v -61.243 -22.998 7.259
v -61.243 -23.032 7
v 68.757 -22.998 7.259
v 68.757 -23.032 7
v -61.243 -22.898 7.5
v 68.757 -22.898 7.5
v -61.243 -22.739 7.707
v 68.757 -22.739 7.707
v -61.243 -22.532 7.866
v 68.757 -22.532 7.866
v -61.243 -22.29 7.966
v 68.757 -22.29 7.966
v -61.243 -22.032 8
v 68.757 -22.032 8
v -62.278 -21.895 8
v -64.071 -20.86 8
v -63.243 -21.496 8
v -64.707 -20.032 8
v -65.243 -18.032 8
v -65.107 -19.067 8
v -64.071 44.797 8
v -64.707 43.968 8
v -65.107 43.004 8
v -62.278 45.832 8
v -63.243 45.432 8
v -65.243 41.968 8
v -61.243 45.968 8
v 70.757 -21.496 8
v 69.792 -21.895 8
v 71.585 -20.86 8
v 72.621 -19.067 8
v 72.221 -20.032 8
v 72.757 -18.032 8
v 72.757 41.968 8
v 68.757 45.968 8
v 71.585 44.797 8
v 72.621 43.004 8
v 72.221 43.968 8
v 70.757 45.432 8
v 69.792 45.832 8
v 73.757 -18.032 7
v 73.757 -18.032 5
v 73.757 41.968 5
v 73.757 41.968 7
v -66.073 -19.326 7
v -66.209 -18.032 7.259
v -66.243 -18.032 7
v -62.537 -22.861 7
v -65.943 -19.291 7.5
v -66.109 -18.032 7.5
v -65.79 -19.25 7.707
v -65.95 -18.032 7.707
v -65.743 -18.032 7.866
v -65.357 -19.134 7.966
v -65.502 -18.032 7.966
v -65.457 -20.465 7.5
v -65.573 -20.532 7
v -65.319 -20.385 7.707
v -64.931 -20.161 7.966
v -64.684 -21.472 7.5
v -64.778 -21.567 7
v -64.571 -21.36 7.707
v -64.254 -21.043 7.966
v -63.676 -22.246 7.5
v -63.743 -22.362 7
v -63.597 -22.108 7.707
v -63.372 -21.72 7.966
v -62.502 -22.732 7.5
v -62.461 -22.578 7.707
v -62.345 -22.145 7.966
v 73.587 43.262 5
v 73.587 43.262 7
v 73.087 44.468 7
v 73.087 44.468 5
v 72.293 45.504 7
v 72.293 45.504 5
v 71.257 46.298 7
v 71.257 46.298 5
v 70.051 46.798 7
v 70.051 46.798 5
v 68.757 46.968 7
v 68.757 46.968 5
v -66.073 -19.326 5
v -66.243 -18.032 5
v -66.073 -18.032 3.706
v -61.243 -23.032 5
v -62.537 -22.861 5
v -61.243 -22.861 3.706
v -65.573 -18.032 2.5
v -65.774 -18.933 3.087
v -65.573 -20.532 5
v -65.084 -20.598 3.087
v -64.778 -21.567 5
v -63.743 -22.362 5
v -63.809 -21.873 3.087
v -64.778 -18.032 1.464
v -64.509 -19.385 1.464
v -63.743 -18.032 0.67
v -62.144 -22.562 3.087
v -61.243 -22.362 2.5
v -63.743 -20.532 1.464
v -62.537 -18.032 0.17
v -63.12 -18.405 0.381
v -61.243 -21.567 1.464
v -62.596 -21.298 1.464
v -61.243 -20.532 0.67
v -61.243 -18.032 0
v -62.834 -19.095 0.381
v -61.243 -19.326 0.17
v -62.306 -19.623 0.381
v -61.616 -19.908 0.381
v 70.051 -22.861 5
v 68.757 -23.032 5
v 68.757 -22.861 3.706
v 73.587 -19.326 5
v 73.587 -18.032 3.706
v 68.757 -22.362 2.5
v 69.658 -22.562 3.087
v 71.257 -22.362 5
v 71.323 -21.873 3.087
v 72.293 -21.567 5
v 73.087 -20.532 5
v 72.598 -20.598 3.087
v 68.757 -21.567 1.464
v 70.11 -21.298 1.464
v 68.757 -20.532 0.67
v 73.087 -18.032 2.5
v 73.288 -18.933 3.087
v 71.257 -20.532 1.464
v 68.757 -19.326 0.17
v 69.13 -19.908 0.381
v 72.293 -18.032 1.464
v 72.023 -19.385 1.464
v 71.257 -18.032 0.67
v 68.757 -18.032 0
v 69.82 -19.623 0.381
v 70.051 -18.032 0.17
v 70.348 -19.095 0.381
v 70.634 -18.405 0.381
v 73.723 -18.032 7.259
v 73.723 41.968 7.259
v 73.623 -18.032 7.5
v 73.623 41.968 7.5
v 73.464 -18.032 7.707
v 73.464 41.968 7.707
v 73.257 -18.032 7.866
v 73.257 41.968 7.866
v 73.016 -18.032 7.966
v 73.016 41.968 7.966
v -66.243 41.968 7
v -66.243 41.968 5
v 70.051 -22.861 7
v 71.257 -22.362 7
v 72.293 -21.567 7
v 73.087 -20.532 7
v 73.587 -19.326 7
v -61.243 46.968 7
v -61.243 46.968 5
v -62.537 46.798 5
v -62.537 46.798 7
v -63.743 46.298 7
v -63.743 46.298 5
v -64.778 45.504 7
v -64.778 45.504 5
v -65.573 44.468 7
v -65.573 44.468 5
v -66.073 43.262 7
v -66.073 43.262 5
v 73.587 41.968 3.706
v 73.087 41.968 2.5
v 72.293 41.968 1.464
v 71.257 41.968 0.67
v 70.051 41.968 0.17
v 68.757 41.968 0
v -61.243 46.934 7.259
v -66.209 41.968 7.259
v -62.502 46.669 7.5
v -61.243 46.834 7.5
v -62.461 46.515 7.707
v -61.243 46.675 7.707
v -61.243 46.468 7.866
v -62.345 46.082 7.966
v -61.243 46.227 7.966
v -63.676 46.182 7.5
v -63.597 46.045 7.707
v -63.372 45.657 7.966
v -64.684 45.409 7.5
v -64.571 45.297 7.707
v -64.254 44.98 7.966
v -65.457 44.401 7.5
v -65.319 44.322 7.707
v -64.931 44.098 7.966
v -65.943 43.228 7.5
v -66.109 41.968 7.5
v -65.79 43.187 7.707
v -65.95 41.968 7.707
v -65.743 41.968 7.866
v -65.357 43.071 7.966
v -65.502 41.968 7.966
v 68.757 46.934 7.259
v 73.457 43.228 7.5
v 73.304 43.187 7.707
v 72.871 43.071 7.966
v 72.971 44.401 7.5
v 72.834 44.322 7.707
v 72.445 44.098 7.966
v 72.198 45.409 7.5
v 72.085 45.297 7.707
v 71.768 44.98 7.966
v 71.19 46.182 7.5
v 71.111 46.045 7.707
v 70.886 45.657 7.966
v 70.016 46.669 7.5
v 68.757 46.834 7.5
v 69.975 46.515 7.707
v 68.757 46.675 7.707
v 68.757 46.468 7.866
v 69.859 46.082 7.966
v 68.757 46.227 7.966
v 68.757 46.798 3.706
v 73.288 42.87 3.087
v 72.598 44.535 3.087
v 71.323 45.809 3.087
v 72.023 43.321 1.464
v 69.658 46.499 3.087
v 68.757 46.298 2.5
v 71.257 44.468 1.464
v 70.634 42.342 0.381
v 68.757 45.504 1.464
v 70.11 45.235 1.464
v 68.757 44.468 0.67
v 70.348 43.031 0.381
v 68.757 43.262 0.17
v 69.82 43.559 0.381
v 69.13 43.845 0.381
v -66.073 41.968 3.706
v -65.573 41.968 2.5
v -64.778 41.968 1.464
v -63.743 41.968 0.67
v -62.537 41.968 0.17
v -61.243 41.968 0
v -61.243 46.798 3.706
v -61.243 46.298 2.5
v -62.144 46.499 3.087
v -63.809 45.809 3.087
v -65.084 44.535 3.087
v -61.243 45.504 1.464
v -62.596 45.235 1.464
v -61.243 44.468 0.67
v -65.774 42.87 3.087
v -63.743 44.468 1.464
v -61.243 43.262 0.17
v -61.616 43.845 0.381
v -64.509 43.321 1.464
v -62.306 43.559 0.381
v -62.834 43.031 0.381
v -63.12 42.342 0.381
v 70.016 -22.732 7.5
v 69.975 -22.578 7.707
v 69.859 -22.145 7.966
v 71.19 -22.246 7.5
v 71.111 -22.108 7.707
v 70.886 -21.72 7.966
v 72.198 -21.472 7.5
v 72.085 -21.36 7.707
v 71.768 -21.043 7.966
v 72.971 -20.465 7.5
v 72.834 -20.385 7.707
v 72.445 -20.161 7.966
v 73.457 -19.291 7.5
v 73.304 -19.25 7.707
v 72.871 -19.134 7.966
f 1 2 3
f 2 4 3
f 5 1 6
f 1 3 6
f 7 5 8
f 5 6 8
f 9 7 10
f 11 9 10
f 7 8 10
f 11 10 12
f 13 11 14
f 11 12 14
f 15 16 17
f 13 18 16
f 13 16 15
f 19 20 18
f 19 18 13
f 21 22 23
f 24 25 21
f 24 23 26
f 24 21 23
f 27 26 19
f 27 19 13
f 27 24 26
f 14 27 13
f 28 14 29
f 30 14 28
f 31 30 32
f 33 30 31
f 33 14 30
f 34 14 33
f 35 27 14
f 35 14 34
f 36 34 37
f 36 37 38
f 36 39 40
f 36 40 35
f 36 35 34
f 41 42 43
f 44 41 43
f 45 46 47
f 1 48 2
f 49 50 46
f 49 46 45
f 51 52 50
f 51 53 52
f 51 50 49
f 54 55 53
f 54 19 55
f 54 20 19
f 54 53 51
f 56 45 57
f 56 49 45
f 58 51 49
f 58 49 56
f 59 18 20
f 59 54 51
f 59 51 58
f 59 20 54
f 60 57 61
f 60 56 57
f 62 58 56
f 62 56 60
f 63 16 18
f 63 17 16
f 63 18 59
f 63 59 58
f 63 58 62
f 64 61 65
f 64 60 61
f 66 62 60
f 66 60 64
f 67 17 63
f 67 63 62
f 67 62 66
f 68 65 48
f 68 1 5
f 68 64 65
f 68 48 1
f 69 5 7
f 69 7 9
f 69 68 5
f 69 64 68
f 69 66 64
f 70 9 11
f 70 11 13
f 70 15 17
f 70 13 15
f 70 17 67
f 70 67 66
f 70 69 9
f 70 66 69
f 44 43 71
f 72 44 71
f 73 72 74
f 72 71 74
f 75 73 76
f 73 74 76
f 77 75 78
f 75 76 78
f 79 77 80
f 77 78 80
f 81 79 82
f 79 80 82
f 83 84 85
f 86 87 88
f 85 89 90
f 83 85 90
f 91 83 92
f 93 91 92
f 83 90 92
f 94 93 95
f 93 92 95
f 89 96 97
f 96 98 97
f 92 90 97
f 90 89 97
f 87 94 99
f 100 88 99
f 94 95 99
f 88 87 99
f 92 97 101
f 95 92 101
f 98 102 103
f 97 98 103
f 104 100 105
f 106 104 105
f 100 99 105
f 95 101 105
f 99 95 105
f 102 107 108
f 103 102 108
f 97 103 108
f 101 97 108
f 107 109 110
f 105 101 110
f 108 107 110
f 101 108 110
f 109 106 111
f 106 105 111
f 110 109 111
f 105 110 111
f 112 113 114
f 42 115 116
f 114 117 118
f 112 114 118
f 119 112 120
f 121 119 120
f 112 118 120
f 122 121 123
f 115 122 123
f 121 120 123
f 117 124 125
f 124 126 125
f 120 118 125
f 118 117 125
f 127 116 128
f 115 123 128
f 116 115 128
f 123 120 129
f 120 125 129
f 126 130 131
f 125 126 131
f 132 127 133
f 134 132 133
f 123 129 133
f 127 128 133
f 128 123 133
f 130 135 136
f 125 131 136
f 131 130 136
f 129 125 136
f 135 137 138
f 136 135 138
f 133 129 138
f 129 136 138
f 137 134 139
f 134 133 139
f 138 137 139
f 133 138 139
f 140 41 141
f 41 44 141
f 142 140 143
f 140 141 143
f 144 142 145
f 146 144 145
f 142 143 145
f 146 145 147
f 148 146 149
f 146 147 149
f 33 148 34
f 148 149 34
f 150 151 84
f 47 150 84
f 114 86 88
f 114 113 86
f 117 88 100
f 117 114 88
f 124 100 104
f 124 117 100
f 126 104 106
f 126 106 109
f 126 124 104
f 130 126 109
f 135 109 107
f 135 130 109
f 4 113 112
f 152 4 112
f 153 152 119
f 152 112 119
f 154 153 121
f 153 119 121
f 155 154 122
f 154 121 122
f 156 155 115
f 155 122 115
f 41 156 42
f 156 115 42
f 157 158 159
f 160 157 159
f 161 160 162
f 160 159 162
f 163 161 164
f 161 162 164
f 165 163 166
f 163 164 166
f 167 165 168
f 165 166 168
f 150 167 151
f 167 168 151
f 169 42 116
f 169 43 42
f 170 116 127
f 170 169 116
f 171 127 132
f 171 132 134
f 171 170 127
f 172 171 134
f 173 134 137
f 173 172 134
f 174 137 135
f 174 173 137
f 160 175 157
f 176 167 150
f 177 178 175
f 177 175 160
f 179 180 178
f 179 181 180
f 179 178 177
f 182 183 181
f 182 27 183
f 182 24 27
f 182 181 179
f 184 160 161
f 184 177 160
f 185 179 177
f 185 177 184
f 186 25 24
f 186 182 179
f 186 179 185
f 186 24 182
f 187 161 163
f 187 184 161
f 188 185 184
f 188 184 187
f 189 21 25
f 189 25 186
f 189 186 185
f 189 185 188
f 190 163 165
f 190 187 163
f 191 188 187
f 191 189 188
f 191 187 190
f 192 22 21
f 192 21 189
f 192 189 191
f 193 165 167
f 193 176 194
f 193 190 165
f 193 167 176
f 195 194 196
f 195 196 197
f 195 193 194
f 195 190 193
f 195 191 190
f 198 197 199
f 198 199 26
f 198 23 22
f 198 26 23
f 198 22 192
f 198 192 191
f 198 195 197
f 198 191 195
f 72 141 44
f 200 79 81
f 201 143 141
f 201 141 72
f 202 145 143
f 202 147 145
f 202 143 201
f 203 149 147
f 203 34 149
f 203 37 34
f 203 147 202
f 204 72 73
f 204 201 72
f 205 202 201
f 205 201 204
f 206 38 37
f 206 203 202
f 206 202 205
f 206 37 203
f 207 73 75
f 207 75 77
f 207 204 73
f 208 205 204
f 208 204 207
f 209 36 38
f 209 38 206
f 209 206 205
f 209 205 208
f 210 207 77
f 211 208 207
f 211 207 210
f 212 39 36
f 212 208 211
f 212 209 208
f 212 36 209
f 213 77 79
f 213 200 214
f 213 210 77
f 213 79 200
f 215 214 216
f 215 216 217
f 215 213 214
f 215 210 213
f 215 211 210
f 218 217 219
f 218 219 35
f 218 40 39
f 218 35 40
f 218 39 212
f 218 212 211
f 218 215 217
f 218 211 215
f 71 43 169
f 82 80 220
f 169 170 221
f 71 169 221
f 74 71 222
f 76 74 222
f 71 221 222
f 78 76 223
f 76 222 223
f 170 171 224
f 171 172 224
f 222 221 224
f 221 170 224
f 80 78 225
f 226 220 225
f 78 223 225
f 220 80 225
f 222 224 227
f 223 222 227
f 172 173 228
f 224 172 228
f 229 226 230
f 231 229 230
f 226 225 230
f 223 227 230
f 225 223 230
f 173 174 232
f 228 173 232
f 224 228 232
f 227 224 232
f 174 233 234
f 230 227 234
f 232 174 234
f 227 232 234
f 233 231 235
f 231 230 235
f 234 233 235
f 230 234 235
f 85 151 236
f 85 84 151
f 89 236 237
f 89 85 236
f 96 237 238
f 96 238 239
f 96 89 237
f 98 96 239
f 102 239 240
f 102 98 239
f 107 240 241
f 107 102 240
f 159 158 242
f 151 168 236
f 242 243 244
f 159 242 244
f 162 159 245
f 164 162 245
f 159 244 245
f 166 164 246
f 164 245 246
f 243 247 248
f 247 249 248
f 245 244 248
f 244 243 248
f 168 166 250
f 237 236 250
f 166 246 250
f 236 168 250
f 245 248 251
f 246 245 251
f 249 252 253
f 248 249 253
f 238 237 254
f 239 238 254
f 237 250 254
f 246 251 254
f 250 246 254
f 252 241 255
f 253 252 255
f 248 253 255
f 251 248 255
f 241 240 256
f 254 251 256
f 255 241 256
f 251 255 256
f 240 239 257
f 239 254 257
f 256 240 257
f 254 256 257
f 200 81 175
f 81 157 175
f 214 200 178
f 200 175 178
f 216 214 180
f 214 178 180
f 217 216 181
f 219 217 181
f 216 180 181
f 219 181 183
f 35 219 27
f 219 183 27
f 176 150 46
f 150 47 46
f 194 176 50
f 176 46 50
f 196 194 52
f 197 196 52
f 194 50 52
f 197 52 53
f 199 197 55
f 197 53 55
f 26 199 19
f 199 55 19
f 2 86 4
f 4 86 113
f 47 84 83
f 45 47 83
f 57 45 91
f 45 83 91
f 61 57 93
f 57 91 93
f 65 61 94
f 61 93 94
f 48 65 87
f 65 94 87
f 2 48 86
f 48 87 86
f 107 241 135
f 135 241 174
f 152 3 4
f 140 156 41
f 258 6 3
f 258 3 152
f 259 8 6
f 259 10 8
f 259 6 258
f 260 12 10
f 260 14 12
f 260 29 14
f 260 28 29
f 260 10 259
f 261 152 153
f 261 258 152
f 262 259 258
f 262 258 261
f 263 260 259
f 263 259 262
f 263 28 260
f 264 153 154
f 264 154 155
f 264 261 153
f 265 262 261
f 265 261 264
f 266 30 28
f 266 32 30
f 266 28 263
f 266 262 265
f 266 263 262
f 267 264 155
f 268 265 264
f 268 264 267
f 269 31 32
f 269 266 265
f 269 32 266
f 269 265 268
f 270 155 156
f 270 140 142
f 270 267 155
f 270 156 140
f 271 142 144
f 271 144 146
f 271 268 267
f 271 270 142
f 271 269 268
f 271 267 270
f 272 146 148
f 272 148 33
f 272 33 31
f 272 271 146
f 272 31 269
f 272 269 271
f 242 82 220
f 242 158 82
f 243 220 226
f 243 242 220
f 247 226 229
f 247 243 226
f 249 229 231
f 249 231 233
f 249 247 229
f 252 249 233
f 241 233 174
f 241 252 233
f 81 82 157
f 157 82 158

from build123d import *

# Parameters (mm, degrees)
F1_DEPTH = 8
F2_R     = 5
F3_R     = 1


with BuildPart() as f1:
    # F0 (on Top) → F1 (new body)
    with BuildSketch(Plane.XY):
        with BuildLine():
            Line((68.7570372224, 46.9683377401), (-61.2429627776, 46.9683377401))
            ThreePointArc((-61.2429627776, 46.9683377401), (-64.7784966835, 45.503871646), (-66.2429627776, 41.9683377401))
            Line((-66.2429627776, 41.9683377401), (-66.2429627776, -18.0316622599))
            ThreePointArc((-66.2429627776, -18.0316622599), (-64.7784966835, -21.5671961658), (-61.2429627776, -23.0316622599))
            Line((-61.2429627776, -23.0316622599), (68.7570372224, -23.0316622599))
            ThreePointArc((68.7570372224, -23.0316622599), (72.2925711283, -21.5671961658), (73.7570372224, -18.0316622599))
            Line((73.7570372224, -18.0316622599), (73.7570372224, 41.9683377401))
            ThreePointArc((73.7570372224, 41.9683377401), (72.2925711283, 45.503871646), (68.7570372224, 46.9683377401))
        make_face()
    extrude(amount=F1_DEPTH)

    # F2
    f2_edges = [f1.edges().sort_by_distance(p)[0] for p in [
        (3.757037, -23.031662, 0),
        (73.757037, 11.968338, 0),
    ]]
    fillet(f2_edges, radius=F2_R)

    # F3
    f3_edges = [f1.edges().sort_by_distance(p)[0] for p in [
        (3.757037, 46.968338, 8),
        (-64.778497, 45.503872, 8),
        (-66.242963, 11.968338, 8),
        (-64.778497, -21.567196, 8),
        (3.757037, -23.031662, 8),
        (72.292571, -21.567196, 8),
        (73.757037, 11.968338, 8),
        (72.292571, 45.503872, 8),
    ]]
    fillet(f3_edges, radius=F3_R)


solid = f1.part
